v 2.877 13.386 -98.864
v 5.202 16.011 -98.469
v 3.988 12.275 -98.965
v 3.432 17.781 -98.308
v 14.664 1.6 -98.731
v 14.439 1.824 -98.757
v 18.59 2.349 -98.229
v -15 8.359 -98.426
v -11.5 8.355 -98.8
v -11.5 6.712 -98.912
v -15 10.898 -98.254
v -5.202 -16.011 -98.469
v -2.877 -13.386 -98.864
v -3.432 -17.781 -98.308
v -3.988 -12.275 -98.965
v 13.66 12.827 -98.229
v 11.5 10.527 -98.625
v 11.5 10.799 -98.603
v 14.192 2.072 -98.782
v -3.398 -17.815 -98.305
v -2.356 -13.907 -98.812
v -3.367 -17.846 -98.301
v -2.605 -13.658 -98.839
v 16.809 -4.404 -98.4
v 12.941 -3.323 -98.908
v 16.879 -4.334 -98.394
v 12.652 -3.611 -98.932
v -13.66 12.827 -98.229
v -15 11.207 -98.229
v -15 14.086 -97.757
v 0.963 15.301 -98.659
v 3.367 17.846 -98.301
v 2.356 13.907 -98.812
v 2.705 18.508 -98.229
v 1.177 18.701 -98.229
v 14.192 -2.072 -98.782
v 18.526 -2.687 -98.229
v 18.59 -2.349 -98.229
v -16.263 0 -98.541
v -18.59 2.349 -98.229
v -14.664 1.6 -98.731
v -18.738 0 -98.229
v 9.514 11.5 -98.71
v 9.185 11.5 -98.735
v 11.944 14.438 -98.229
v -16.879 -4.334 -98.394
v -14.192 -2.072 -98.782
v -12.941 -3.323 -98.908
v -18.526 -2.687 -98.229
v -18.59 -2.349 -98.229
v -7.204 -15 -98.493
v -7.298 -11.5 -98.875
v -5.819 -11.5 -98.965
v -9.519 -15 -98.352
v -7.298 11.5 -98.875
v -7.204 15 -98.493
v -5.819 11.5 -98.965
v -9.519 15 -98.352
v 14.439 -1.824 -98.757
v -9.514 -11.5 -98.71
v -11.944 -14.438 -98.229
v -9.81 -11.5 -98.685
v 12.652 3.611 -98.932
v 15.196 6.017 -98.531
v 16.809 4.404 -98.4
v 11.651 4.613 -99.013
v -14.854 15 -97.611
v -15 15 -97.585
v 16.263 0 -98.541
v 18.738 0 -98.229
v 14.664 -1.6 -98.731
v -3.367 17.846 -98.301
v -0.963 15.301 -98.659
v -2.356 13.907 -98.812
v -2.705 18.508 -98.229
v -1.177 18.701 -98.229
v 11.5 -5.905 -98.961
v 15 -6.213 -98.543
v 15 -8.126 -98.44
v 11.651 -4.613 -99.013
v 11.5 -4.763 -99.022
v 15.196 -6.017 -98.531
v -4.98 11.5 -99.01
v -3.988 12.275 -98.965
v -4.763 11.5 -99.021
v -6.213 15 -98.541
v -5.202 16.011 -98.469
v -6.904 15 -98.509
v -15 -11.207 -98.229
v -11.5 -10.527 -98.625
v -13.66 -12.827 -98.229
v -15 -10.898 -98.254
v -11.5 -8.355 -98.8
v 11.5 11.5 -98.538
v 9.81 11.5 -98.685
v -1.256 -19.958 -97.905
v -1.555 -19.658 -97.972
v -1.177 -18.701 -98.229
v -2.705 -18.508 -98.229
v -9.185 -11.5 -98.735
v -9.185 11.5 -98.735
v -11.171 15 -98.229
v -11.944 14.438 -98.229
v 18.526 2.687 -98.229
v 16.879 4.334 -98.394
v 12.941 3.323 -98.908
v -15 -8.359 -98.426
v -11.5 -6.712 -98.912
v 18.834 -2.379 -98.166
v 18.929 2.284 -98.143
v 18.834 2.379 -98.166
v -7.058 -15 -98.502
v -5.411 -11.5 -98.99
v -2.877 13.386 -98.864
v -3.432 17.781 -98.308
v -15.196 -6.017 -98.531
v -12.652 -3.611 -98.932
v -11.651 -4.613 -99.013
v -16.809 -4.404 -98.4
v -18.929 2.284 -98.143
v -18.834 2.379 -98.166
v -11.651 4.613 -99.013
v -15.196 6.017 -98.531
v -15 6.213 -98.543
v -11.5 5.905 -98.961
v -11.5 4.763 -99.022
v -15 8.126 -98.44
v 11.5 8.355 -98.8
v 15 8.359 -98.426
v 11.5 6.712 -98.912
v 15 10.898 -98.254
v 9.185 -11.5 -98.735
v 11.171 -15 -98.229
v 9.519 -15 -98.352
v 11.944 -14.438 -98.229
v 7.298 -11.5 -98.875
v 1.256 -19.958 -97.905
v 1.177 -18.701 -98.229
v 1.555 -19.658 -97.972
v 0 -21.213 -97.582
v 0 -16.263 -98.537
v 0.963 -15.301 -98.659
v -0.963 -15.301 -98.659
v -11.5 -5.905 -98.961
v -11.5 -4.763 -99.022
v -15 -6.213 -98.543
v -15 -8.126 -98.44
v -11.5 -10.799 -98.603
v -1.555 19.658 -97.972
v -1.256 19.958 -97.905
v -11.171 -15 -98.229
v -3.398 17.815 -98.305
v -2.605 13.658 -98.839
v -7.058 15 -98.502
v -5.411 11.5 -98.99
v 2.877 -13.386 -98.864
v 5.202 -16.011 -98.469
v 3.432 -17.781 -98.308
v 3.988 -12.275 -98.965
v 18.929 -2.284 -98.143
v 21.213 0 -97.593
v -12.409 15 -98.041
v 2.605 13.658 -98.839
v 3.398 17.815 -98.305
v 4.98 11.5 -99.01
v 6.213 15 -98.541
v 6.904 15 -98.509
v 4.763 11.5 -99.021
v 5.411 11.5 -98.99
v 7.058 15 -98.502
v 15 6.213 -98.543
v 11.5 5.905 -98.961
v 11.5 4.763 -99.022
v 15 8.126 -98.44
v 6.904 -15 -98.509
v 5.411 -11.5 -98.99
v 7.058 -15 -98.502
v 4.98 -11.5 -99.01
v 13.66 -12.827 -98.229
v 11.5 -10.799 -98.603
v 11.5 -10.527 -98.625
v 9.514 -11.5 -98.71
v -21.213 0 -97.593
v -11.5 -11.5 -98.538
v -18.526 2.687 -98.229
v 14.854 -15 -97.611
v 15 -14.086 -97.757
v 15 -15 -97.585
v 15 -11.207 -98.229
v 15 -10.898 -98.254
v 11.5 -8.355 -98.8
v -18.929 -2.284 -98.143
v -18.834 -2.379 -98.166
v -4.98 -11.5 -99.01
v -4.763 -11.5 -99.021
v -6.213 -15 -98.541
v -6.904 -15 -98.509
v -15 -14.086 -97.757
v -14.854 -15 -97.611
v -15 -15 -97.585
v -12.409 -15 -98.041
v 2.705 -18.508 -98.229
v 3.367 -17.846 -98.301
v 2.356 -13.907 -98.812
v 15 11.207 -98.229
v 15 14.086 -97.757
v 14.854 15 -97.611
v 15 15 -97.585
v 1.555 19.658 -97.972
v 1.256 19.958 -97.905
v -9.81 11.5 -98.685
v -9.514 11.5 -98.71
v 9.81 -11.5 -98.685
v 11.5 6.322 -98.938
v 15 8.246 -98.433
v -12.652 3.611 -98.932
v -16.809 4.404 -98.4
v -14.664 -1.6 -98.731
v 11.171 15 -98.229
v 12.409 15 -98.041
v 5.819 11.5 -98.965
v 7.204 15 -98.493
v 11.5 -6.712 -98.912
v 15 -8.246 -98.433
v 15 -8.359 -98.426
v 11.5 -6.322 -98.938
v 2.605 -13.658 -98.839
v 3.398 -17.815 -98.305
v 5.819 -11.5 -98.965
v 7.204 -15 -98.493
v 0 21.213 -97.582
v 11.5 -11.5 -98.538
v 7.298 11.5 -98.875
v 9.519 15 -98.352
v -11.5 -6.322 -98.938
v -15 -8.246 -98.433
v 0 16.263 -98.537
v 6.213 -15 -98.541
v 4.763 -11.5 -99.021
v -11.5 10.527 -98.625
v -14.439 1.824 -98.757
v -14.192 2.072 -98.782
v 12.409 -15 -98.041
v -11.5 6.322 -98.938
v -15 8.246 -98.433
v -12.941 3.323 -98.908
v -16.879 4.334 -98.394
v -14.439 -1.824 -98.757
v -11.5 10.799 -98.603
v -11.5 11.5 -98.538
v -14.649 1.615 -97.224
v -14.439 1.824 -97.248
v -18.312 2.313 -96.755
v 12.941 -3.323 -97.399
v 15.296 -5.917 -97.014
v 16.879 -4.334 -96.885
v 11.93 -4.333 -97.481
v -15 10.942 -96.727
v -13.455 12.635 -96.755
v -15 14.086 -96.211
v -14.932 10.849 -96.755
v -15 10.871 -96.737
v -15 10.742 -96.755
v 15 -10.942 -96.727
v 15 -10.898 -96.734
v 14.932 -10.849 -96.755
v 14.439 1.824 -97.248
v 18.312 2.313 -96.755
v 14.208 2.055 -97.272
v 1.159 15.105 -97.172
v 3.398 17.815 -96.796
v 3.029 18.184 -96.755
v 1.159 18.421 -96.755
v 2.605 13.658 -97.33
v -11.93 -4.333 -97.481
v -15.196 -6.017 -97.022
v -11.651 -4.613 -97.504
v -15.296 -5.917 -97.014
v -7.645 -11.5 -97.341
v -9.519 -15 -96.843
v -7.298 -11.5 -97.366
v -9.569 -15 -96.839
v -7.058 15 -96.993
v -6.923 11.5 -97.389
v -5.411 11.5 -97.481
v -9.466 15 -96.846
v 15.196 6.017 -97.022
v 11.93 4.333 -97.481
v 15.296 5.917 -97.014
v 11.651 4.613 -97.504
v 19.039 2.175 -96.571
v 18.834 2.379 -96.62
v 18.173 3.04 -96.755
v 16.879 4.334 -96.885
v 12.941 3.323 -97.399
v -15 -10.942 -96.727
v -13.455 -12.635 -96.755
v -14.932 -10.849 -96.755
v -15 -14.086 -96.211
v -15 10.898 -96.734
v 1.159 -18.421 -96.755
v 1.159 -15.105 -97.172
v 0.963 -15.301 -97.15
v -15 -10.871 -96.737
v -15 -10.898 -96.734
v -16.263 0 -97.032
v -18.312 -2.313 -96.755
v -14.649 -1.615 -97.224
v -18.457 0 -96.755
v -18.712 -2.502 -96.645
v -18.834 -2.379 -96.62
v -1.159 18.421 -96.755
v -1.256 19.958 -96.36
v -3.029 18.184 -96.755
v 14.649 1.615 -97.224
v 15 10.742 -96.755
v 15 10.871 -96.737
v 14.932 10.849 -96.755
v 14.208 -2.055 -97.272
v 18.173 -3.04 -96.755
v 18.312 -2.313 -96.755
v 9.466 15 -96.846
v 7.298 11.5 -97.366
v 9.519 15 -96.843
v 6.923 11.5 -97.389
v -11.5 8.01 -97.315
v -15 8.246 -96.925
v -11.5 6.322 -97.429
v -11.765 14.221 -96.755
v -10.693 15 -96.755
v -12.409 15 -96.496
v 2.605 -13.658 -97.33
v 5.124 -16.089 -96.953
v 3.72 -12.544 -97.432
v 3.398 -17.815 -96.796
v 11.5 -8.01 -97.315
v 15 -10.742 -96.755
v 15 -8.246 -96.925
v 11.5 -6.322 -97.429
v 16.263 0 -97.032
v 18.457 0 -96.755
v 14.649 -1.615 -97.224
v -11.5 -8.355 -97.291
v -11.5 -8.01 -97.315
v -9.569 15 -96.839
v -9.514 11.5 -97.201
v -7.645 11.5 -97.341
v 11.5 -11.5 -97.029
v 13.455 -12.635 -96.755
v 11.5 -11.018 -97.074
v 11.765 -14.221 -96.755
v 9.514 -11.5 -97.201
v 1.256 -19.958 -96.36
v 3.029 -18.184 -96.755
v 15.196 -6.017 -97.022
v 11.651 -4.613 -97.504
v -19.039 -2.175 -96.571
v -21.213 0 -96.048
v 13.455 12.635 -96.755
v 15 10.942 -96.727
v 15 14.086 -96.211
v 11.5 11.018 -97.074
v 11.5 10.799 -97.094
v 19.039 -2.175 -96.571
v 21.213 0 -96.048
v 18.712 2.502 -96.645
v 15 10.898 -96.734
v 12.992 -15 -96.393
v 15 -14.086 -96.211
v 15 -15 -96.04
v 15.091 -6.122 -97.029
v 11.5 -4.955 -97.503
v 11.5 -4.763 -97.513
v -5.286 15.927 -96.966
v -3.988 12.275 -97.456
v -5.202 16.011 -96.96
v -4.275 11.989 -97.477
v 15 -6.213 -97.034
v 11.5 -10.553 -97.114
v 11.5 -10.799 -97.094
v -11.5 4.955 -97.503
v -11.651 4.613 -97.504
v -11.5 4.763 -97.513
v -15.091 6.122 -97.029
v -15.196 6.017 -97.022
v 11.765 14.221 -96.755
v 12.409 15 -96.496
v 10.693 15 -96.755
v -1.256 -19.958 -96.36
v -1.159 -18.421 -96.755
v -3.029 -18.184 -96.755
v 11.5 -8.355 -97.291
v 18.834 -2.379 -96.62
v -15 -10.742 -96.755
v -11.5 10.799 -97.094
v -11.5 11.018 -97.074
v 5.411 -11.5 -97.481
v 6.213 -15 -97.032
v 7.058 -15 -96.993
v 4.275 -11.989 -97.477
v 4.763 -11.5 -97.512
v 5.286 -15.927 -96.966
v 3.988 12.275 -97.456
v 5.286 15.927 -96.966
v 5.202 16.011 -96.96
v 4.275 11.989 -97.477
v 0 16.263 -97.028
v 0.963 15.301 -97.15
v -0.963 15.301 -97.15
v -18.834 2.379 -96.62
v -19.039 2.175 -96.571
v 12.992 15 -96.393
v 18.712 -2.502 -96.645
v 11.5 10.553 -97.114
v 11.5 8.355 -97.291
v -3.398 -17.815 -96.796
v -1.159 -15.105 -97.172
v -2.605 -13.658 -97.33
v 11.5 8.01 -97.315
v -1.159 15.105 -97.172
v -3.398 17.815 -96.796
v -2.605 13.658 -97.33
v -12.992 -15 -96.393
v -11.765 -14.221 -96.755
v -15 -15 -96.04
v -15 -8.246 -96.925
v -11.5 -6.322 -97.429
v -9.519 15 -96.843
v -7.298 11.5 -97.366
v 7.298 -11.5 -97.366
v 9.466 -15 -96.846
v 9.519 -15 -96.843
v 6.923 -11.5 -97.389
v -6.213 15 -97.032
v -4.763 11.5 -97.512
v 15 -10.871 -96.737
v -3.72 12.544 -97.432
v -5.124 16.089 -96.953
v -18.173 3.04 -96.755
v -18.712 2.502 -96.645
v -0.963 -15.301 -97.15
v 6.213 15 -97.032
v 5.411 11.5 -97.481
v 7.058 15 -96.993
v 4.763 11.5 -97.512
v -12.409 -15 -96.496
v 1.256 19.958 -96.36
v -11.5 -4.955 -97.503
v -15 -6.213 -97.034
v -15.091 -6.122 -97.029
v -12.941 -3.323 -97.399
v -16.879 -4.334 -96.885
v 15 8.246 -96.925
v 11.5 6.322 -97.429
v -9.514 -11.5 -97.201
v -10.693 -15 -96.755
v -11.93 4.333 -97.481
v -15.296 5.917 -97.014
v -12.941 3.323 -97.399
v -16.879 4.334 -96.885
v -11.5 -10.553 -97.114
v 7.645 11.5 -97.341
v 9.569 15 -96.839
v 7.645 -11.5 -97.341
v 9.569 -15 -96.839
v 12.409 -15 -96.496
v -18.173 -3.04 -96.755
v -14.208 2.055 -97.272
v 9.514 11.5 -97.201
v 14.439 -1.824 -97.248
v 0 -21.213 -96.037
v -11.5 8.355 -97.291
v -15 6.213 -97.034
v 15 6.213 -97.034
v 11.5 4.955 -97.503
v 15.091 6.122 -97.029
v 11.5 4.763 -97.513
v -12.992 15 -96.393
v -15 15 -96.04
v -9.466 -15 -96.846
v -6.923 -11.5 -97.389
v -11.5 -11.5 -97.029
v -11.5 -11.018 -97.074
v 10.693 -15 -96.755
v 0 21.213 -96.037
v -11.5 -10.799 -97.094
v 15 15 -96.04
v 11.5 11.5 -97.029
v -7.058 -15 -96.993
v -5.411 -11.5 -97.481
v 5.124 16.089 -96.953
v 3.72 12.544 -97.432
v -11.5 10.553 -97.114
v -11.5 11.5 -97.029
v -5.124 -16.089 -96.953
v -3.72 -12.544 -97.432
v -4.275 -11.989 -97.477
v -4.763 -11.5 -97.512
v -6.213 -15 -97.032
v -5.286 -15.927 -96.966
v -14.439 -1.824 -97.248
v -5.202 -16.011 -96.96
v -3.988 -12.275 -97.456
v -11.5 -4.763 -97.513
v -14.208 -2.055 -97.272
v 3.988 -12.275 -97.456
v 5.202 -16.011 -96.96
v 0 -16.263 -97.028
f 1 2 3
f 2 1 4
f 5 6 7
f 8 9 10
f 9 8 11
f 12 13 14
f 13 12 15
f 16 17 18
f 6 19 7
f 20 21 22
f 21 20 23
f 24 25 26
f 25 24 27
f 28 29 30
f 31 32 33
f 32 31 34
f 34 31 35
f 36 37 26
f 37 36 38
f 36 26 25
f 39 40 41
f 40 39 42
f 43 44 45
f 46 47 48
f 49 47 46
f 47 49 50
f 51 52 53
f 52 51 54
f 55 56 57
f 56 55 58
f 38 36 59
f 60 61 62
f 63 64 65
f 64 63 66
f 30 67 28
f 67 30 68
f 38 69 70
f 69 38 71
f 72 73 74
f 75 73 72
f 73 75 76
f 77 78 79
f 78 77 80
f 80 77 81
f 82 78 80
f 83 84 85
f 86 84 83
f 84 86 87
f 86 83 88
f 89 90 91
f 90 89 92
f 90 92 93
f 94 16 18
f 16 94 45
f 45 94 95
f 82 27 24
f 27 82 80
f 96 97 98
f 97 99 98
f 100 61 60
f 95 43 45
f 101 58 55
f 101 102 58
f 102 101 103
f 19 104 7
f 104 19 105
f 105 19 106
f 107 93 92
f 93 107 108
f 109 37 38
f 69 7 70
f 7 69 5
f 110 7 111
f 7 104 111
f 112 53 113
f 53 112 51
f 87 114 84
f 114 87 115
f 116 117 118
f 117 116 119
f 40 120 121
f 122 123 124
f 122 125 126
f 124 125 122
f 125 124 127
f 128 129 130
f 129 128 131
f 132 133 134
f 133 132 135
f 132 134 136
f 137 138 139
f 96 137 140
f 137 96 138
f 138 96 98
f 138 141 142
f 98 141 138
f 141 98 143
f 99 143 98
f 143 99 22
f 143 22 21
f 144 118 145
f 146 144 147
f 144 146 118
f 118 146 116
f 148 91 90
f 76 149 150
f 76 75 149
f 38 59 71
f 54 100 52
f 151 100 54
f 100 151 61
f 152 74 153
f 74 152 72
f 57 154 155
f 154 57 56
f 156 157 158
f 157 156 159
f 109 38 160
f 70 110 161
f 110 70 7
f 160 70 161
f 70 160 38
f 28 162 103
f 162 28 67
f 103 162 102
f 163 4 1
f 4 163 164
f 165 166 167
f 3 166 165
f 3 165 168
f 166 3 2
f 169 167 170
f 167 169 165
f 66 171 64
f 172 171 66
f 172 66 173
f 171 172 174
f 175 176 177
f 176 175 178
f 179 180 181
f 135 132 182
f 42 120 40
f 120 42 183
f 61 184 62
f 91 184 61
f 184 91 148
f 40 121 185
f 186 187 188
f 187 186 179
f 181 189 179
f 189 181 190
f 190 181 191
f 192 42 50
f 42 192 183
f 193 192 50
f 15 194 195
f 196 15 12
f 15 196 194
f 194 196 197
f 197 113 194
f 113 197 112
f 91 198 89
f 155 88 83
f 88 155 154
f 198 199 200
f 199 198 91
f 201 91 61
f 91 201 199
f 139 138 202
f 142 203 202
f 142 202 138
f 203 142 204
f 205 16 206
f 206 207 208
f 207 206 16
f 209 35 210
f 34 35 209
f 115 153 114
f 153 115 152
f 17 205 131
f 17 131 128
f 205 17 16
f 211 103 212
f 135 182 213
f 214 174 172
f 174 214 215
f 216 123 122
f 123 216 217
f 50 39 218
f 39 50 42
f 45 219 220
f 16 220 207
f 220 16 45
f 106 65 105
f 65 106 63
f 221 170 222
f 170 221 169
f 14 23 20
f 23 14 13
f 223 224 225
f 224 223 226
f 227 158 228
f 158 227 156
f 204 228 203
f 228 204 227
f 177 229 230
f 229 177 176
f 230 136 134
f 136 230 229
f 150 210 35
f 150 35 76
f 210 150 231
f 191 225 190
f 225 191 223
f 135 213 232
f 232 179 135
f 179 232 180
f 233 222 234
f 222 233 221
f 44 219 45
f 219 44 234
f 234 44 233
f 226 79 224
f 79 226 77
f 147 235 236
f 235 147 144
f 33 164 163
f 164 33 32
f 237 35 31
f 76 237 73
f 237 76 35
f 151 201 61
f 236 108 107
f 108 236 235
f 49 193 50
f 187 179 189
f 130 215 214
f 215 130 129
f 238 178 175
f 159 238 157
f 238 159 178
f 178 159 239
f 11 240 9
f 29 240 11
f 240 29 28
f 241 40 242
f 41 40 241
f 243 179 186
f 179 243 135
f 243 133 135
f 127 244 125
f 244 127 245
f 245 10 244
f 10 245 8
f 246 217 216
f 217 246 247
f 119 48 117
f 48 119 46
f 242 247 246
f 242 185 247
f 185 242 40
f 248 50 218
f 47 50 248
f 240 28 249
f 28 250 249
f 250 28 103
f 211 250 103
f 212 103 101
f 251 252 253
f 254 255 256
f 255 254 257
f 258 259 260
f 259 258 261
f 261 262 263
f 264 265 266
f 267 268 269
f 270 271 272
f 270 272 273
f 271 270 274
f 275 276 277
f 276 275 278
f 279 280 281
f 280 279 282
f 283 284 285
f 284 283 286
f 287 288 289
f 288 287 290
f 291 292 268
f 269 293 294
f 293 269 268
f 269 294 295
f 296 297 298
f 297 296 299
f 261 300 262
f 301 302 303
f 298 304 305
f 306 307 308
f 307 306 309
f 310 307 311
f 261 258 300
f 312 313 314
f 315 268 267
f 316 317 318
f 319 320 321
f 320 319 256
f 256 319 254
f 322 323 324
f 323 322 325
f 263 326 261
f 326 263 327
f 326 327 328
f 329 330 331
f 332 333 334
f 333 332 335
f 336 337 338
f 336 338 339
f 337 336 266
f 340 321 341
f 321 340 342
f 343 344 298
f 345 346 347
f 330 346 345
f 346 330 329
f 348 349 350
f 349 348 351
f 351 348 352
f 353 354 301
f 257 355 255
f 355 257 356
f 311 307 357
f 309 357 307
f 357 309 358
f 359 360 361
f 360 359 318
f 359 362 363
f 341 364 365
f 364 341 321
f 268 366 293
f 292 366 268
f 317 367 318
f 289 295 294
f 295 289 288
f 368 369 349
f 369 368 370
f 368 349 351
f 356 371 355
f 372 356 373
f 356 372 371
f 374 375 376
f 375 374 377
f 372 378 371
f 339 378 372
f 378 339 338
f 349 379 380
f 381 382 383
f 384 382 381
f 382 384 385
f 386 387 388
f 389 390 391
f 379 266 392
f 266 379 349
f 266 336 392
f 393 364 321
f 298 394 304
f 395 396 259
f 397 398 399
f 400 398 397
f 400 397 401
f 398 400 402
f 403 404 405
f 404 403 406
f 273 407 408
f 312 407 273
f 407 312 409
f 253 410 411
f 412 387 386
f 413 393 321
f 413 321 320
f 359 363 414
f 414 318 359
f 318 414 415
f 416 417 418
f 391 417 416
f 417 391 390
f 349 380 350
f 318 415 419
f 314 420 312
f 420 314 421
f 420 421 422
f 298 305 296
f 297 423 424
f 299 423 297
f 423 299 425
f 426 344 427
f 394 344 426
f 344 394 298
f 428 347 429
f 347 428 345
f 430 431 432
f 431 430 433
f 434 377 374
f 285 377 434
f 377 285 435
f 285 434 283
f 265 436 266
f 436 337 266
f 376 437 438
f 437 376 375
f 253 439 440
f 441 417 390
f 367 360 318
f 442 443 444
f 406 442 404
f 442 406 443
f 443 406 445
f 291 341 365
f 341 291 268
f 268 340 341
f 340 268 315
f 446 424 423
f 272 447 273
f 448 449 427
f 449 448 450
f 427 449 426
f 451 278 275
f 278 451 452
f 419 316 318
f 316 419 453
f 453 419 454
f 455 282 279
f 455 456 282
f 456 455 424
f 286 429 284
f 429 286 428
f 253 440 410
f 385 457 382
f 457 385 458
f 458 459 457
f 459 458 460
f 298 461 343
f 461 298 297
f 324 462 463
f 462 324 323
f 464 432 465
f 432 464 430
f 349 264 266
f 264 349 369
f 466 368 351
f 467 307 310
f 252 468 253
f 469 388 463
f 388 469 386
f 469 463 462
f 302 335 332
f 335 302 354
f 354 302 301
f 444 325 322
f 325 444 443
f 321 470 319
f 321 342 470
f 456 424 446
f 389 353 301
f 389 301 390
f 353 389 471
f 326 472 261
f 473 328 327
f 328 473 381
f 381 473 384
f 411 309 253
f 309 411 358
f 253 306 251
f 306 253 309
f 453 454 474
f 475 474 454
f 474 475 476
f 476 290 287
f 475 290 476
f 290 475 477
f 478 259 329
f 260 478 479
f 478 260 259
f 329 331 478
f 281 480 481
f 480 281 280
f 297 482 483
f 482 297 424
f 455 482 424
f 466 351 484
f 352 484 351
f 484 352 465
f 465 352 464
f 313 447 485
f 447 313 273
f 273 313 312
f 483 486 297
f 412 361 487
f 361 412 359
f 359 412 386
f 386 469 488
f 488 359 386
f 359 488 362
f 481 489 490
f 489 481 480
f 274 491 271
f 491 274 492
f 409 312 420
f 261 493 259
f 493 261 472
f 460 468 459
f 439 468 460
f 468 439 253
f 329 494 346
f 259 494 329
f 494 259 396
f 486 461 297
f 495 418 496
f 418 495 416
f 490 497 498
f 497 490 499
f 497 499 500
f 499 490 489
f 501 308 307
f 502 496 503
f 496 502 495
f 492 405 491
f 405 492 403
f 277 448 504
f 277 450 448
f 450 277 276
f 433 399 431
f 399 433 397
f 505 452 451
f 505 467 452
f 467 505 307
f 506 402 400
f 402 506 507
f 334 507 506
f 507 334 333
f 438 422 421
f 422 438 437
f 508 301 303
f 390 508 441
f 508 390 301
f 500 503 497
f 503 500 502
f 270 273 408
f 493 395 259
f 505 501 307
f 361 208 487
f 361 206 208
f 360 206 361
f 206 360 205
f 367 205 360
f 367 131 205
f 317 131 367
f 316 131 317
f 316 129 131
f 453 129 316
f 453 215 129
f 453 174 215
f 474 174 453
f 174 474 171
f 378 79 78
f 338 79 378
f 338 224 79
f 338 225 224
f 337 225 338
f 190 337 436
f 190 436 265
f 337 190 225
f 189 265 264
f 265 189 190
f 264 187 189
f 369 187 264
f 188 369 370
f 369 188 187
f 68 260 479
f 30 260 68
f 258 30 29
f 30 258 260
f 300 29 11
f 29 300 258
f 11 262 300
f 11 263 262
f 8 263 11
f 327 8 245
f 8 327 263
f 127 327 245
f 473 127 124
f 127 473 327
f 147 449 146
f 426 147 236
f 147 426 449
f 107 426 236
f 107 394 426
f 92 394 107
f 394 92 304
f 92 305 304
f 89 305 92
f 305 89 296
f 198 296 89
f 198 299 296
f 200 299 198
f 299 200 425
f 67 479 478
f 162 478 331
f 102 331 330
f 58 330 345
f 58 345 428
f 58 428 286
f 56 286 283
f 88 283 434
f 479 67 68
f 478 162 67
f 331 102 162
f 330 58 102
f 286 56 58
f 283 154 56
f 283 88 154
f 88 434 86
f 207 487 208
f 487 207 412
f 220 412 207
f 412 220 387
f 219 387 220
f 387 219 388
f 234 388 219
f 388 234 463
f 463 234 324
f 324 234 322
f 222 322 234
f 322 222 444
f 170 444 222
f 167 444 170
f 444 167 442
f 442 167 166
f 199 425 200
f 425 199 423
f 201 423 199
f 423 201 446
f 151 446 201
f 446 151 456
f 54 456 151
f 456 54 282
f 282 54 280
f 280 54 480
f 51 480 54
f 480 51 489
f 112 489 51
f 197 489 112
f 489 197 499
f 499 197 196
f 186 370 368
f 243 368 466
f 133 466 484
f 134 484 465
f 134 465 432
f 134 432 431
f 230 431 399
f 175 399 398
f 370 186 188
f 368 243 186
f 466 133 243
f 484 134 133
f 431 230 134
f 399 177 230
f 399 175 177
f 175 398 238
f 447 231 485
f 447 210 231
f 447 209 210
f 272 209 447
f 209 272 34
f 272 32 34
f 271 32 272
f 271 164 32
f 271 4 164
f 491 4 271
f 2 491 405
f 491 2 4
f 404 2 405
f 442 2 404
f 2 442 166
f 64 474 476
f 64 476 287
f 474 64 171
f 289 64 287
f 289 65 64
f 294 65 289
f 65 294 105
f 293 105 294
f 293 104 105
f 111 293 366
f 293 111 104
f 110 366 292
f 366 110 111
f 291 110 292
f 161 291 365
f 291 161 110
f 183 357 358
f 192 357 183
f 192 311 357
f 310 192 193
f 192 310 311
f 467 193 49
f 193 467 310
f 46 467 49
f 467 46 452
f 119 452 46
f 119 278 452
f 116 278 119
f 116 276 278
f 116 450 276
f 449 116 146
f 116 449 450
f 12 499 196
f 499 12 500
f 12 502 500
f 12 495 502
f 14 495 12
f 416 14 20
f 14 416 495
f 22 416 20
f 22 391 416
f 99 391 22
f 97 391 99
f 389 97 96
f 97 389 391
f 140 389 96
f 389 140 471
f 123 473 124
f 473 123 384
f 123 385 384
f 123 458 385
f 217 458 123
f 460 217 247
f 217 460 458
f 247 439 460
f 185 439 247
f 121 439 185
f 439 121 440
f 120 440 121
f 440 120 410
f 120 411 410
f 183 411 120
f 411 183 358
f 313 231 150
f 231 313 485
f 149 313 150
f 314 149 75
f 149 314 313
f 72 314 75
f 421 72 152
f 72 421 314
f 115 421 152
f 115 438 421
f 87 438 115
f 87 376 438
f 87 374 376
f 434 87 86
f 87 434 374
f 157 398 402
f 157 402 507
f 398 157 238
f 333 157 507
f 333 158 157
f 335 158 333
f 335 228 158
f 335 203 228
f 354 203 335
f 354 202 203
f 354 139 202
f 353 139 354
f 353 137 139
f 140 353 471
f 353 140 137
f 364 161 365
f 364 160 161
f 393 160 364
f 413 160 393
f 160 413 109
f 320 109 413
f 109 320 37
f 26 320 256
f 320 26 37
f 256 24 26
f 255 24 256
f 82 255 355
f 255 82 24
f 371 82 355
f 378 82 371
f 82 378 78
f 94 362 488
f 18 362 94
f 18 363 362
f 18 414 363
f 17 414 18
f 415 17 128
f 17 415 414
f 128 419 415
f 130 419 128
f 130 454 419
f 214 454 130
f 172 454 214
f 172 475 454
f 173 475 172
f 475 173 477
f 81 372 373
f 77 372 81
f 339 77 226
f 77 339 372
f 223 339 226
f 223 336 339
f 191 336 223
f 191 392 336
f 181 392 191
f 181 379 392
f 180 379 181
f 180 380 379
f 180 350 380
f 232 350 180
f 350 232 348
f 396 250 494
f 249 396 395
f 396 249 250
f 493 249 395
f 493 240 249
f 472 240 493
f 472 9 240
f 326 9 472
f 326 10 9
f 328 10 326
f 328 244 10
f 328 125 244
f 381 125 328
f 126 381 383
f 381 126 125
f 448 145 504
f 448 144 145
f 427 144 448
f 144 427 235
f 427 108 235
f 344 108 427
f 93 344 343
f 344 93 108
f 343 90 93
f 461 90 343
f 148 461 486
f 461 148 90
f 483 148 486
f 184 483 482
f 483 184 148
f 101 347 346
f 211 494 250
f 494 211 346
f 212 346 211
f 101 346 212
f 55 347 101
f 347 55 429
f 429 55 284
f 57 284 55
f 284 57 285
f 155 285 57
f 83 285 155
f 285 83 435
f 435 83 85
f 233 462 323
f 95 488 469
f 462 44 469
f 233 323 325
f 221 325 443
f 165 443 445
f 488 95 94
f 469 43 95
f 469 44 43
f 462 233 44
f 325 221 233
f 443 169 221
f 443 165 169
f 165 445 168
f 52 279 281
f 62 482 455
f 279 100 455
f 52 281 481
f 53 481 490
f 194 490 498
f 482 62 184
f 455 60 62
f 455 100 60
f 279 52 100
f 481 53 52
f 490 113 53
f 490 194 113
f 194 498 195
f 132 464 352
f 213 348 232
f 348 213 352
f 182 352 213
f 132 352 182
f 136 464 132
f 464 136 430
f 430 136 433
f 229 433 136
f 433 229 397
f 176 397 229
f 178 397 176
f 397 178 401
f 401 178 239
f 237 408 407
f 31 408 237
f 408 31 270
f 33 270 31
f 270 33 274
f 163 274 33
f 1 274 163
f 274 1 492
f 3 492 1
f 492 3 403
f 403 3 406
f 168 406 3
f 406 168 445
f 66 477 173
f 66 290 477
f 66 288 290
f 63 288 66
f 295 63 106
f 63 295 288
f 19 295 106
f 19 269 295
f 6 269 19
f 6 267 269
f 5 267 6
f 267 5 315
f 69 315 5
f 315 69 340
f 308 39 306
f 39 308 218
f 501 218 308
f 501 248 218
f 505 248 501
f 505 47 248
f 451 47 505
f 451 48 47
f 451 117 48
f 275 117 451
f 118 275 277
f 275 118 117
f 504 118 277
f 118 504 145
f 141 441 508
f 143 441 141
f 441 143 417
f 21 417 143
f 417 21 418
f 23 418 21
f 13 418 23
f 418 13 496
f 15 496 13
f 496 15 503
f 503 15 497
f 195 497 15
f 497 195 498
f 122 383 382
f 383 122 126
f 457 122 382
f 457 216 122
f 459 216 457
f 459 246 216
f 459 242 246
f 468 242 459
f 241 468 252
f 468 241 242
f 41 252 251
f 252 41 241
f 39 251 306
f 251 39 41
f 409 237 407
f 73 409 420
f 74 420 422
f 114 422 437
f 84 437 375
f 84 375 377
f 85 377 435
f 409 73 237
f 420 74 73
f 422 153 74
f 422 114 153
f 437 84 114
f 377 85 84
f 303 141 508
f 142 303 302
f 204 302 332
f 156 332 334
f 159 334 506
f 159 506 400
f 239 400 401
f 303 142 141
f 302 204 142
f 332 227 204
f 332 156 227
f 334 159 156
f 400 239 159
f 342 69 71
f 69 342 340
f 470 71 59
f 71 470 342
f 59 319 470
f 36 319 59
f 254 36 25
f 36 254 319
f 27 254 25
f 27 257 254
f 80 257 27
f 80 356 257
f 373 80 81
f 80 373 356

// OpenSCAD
module scaffold(numRings = 36, D = 200, TH = 3, bandW = 1){
	assign(rotX = rands(0,360,1)[0], rotY = rands(0,360,1)[0], rotZ = rands(0,360,1)[0])
	union() {
		for( i = [0:numRings] ){
			ring(D, TH, bandW, rotX*i, rotY*i, 0);
		}
	}
}

module ring(D = 50, TH = 2, bandW = 4, rotX = 90, rotY = 0, rotZ = 0){
	rotate(a=[rotX, rotY, rotZ]){
		intersection(){
			difference() {
				sphere(r = D/2, $fn=50);
				sphere(r = D/2 - TH/2, $fn=50);
			}
			cube(size = [D*1.5,D*1.5,bandW], center = true);
		}
	}
}

module spine(hs = 1,c=3){
    assign(wi = 0.05*hs, ch = hs*0.1){
        for(a = [360/c:360/c:360]){
            rotate([0,0,a]) rotate([45,0,0]) cylinder(hs*0.3,hs*0.04,hs*0.01);
        }
	}
}
module octStar(D = 200, r = 30){
	cube(size = [r,r,D*1.5], center = true);
	rotate([0,0,45])
	cube(size = [r,r,D*1.5], center = true);
}
module circleToken(D = 200, TH = 3, bandW = 5){
	intersection(){
		difference() {
			sphere(r = D/2, $fn=50);
			sphere(r = D/2 - TH/2, $fn=50);
		}
		translate([0,0,-D/3])
		difference(){
			octStar(r = 30);
			octStar(r = 23);
		}
		//difference() {
		//	cylinder(h = D*1.5, r = 20);
		//	cylinder(h = D*1.5, r = 15);
		//}
	}
}
//octStar();
circleToken();
//scaffold(numRings = 36, D = 200, TH = 3, bandW = 1);
